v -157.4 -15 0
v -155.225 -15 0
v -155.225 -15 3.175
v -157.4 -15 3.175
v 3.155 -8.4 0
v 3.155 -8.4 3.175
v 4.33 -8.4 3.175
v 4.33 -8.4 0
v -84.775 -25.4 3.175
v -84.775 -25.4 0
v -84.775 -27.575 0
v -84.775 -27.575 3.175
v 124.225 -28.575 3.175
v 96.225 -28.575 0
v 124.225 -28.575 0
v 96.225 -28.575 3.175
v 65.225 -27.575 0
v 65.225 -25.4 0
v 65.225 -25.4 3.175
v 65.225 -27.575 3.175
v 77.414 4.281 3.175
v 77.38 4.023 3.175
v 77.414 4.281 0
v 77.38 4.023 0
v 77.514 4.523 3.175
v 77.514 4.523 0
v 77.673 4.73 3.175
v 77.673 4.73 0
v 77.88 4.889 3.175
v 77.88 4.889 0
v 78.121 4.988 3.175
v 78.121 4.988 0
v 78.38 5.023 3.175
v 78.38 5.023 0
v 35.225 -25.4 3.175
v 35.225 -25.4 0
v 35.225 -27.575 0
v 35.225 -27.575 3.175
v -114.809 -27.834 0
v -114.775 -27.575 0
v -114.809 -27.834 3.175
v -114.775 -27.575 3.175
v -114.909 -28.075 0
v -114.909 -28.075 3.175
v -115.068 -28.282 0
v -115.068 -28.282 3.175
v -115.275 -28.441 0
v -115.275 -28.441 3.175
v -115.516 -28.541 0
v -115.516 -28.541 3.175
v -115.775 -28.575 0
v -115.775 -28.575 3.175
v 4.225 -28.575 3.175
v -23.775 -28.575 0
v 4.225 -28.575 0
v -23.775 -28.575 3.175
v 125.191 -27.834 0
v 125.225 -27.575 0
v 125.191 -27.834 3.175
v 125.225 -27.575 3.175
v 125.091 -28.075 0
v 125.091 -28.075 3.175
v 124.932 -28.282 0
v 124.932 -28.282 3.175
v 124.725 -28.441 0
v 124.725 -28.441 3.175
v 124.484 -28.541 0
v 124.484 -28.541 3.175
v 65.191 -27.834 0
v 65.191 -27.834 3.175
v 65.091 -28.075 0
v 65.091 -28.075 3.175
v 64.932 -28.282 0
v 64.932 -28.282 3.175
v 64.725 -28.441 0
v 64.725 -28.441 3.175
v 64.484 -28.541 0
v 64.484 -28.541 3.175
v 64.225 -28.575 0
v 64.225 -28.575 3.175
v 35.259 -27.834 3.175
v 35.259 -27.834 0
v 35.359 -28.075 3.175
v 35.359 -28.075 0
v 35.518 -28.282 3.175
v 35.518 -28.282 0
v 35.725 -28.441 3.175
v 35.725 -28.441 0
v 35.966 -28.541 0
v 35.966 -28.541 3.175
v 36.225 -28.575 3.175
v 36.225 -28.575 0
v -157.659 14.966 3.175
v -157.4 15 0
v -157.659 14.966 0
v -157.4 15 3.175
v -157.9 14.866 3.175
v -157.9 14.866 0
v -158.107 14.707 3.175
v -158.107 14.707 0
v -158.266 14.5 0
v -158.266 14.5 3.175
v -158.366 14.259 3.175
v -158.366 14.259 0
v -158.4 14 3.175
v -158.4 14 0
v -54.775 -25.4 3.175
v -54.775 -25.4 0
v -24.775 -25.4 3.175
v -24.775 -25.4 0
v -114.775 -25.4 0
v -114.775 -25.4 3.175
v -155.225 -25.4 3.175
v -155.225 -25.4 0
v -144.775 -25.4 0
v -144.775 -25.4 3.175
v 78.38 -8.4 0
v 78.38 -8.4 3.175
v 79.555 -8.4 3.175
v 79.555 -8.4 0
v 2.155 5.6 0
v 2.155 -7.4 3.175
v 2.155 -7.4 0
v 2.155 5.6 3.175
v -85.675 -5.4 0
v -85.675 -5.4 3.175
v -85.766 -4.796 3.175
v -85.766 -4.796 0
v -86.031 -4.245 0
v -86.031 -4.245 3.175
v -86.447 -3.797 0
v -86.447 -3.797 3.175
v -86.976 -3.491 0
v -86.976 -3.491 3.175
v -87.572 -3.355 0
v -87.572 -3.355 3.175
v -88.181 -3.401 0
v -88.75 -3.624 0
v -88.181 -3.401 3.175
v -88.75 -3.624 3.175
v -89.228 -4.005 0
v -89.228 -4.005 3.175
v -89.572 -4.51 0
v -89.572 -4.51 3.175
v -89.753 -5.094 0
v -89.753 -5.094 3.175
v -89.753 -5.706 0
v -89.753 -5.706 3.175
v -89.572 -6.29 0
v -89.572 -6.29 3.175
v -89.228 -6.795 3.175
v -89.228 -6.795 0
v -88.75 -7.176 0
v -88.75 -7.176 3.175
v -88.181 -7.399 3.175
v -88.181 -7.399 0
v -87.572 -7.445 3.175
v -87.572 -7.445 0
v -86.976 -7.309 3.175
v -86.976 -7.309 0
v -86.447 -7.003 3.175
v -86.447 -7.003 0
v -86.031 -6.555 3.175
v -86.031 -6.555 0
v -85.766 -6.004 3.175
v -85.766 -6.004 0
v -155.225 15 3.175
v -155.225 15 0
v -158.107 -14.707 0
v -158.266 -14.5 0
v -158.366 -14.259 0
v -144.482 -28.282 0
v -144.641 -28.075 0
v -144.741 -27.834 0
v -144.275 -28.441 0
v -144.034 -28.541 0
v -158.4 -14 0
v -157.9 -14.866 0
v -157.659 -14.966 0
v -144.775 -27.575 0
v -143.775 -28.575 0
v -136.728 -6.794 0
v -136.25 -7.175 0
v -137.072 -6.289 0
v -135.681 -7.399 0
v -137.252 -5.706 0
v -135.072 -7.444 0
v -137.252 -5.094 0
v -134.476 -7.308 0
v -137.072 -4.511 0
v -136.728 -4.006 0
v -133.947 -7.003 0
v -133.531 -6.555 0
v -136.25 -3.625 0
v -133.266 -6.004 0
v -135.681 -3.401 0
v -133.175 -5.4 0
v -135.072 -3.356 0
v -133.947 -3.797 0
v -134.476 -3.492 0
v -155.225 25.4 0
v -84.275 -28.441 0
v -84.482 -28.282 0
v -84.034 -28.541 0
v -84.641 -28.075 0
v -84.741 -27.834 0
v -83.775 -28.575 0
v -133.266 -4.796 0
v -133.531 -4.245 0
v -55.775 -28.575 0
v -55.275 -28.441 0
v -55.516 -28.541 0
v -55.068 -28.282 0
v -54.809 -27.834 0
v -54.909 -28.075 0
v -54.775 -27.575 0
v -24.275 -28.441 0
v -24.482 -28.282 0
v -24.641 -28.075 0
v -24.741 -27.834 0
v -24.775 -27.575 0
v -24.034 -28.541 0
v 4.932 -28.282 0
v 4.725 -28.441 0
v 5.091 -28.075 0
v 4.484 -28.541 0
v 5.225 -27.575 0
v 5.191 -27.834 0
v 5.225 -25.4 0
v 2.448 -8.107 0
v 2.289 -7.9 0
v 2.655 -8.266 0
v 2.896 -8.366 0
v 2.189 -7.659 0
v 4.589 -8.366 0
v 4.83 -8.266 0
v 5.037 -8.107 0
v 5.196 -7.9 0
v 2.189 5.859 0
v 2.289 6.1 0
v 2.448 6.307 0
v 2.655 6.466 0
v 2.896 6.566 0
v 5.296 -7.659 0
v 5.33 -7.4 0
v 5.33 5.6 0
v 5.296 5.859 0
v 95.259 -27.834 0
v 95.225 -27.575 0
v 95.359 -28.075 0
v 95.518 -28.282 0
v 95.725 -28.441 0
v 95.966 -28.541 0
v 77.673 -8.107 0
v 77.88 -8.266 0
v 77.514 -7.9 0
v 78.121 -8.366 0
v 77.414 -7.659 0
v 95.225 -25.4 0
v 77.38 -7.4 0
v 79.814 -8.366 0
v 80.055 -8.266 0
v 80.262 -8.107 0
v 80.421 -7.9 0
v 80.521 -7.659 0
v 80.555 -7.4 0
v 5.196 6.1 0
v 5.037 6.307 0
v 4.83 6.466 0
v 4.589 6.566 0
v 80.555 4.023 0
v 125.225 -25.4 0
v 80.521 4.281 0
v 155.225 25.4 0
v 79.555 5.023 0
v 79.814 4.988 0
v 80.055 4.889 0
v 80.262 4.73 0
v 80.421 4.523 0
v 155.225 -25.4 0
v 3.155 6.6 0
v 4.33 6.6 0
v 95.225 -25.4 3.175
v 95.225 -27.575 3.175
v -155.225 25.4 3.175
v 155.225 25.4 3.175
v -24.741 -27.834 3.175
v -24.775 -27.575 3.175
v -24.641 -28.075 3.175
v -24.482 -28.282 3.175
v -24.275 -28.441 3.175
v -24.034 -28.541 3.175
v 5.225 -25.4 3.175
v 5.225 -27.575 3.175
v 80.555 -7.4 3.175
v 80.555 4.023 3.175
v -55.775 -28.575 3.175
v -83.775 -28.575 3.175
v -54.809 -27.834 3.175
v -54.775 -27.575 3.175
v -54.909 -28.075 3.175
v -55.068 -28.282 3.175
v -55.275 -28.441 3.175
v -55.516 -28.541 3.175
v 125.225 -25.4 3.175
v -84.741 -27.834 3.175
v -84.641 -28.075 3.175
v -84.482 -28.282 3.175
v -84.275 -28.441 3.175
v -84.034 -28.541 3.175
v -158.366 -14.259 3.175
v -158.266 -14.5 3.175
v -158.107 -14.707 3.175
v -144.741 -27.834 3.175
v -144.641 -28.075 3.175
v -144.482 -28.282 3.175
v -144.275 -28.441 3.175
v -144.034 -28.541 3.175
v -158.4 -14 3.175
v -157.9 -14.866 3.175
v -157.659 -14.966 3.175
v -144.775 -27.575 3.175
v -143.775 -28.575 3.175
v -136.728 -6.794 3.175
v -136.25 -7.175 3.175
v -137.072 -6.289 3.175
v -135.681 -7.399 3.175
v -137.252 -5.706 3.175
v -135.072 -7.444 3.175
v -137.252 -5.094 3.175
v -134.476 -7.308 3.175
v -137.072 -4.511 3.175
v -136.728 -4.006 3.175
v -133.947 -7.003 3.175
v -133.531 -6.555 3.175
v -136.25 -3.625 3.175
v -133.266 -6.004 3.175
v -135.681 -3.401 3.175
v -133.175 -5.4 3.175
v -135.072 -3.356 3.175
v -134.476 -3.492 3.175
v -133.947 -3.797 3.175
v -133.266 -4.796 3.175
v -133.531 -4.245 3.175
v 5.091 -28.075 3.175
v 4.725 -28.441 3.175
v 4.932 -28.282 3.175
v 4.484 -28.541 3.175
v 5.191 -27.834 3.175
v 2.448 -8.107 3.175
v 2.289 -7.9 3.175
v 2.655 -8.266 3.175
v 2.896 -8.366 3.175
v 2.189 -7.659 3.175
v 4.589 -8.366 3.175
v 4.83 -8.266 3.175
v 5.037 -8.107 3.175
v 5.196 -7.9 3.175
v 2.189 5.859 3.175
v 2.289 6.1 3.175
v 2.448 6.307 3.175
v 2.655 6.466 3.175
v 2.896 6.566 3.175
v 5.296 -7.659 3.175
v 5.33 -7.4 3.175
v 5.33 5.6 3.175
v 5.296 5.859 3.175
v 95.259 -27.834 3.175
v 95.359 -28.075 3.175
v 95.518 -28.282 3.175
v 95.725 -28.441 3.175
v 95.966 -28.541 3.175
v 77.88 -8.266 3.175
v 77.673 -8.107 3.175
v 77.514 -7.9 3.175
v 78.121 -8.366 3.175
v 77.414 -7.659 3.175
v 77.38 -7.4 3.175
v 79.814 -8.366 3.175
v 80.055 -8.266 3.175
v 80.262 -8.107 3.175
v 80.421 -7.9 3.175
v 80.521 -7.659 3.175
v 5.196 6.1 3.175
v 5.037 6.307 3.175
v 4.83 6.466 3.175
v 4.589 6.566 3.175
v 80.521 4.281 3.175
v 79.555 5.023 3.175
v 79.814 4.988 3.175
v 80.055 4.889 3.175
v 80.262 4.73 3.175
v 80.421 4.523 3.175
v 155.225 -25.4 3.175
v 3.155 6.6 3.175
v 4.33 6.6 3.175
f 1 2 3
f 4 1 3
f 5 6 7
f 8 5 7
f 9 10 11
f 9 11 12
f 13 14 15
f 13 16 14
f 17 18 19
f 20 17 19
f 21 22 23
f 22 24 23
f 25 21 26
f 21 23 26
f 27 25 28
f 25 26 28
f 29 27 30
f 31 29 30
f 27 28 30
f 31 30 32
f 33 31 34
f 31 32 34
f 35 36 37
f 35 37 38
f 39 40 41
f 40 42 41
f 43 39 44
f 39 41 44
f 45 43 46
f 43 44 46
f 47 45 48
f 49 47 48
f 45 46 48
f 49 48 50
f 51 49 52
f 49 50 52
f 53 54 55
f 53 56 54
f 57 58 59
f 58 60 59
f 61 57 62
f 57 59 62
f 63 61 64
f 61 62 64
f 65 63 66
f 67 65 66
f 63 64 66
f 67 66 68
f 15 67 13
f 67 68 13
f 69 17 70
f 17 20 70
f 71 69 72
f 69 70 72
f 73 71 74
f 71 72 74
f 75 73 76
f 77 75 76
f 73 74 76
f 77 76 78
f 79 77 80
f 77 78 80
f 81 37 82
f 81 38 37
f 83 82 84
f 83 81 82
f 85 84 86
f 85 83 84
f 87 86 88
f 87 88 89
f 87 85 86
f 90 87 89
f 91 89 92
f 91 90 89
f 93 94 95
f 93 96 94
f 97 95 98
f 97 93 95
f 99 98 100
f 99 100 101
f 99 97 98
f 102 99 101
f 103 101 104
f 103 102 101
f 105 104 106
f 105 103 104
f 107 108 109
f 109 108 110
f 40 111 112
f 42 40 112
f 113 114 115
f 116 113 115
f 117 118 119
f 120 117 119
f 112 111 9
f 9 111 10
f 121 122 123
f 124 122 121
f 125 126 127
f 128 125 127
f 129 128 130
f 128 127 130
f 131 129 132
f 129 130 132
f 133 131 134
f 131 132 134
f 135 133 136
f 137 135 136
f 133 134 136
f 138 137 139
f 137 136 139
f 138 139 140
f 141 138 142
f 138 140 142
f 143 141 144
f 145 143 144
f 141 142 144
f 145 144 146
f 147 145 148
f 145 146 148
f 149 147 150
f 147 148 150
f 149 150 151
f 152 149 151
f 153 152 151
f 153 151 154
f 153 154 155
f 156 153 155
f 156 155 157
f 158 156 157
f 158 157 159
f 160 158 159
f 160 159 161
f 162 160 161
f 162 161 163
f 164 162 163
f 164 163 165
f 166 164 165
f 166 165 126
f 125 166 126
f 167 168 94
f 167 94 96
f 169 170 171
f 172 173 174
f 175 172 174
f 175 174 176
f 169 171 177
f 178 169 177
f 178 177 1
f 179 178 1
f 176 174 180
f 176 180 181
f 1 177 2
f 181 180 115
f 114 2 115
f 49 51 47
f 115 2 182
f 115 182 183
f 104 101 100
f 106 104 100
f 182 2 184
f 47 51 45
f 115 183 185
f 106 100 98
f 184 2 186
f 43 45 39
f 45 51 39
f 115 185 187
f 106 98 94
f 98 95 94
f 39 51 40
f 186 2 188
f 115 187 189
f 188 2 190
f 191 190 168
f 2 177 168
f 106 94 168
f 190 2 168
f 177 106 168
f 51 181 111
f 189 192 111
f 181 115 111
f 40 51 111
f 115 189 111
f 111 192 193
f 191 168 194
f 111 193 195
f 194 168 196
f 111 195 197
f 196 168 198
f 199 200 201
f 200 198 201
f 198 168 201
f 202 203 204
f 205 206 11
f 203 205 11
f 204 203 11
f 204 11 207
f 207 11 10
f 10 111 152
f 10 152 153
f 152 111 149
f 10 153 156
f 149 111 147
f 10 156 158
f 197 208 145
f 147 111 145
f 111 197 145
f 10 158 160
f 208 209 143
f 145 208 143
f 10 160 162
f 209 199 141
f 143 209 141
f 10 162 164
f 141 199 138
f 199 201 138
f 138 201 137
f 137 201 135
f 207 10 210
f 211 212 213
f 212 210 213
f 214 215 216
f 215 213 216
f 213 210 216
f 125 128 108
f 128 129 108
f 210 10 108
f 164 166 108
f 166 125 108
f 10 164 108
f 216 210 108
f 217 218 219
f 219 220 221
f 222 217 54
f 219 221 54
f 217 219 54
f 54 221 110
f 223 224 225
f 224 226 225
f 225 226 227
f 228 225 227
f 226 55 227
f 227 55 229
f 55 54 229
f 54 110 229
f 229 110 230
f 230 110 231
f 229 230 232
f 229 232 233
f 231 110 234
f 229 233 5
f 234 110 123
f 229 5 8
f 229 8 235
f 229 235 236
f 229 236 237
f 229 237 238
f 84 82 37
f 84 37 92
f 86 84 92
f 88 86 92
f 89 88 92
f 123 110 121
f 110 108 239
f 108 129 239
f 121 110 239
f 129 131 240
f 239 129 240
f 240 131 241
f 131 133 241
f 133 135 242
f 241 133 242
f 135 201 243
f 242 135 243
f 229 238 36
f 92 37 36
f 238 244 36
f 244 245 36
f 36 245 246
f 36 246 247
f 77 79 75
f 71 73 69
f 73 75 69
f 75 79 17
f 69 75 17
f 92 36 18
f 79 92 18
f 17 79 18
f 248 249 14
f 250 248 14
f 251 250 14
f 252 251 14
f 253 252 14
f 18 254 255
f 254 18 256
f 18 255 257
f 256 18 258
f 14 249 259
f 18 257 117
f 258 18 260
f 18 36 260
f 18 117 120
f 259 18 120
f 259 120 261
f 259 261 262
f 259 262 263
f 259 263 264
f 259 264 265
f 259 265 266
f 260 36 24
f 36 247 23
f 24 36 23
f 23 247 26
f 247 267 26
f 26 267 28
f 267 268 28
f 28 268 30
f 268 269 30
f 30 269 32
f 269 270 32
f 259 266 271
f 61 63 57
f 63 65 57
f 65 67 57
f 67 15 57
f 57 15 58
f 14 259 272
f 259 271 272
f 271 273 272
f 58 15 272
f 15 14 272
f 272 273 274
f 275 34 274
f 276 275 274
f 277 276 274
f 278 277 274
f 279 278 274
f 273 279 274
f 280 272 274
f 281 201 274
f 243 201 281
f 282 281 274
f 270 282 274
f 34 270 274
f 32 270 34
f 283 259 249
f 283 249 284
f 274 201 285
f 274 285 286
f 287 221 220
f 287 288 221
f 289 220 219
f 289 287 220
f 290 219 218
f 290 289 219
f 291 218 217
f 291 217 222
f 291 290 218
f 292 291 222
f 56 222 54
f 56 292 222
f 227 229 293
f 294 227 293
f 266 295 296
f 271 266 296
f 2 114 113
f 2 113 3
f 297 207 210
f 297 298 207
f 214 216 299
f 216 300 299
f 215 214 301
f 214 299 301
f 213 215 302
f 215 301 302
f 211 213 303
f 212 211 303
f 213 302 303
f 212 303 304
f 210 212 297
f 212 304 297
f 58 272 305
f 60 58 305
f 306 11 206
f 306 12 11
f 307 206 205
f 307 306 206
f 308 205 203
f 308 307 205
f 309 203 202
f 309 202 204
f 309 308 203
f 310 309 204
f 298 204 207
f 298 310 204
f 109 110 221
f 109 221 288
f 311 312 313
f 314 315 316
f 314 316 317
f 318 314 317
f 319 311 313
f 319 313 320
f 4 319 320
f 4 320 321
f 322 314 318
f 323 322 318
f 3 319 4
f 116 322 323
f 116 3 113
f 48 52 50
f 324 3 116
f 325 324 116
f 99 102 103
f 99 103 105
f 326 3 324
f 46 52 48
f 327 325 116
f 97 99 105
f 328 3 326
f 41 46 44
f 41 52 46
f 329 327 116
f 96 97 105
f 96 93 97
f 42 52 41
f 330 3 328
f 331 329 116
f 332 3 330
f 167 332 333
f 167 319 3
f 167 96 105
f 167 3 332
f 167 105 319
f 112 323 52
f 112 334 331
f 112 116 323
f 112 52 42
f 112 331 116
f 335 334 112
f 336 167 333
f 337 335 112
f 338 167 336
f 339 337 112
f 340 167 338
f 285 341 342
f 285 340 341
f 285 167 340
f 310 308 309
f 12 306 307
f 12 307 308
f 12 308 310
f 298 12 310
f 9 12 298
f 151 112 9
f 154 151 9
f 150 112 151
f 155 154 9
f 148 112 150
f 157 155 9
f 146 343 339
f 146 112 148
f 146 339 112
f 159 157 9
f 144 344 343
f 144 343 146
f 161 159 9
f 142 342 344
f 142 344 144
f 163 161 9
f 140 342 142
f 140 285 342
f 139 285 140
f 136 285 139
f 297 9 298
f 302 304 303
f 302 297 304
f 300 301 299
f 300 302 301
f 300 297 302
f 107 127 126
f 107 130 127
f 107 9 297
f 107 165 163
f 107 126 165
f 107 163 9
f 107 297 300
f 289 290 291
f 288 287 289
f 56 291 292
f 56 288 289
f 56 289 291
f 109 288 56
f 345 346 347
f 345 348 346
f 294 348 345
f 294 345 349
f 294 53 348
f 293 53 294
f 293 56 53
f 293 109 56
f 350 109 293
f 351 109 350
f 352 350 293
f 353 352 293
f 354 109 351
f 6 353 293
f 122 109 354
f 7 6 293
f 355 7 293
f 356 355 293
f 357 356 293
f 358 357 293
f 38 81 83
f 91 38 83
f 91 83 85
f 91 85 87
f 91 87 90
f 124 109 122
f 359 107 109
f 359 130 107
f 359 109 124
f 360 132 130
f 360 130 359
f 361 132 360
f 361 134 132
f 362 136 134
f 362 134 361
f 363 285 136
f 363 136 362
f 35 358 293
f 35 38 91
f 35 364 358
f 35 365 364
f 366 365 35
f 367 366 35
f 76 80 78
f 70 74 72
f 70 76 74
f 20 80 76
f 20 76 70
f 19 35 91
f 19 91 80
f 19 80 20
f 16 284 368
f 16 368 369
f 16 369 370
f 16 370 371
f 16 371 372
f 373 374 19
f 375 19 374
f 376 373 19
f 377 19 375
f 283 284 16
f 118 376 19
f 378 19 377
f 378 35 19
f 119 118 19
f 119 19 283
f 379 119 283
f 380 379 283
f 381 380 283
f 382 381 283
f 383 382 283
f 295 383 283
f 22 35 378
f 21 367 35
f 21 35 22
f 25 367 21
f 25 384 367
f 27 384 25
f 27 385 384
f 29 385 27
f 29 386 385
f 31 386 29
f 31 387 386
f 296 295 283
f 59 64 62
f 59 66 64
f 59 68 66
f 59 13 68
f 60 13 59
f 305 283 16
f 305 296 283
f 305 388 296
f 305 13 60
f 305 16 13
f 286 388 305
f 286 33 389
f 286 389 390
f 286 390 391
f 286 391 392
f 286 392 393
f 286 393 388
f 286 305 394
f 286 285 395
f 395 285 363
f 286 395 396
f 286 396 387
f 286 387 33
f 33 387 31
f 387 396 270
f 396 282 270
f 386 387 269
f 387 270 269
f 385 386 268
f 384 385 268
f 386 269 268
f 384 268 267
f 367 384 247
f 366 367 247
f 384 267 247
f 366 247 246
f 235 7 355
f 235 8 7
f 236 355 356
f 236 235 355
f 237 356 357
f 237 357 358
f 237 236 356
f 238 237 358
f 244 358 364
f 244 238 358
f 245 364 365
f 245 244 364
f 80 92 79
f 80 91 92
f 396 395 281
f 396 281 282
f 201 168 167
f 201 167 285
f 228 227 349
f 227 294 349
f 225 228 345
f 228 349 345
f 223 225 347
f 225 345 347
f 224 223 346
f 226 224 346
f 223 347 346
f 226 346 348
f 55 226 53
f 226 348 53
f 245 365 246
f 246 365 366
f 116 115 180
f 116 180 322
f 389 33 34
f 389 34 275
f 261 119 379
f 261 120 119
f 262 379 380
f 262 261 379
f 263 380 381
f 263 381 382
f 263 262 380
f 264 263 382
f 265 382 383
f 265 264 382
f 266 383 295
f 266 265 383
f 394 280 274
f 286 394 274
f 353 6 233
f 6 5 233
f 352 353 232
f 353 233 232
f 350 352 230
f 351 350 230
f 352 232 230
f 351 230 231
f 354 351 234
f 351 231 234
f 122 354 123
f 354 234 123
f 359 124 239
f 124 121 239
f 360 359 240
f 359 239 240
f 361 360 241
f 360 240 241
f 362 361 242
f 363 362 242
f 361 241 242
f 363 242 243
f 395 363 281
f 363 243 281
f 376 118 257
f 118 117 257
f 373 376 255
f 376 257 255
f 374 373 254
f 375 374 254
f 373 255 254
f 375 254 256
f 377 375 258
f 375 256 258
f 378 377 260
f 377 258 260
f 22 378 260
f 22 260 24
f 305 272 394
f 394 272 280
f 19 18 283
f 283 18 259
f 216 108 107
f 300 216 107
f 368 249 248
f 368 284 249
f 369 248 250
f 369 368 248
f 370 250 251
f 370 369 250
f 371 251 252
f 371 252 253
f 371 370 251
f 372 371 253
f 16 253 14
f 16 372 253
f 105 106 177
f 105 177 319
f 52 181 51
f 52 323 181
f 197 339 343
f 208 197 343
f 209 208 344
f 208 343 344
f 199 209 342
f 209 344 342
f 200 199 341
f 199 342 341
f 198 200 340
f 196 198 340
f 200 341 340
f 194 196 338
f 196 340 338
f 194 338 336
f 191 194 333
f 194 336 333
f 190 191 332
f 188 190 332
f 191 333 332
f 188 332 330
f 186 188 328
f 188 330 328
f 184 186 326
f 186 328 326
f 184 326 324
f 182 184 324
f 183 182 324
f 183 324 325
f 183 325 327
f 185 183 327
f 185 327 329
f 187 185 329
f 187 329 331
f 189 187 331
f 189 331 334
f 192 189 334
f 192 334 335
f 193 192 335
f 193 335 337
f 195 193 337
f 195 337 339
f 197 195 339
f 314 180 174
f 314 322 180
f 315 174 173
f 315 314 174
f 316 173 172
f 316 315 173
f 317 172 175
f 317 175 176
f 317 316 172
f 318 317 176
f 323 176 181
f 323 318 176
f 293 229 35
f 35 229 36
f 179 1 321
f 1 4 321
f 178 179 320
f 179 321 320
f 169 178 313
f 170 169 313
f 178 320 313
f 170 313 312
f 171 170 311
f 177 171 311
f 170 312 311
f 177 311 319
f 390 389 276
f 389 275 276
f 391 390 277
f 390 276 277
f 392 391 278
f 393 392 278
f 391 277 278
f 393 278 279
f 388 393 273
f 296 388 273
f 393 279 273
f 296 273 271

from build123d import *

# Parameters (mm, degrees)
SKETCH1_W           = 310.45
SKETCH1_H           = 50.8
BOSS_EXTRUDE1_DEPTH = 3.175
SKETCH2_R           = 2.05
SKETCH2_R_2         = 2.050488176
SKETCH2_W           = 3.175
SKETCH2_H           = 13.42251169
SKETCH2_H_2         = 15
CUT_EXTRUDE1_DEPTH  = 4.175
SKETCH3_W           = 3.175
SKETCH3_H           = 30
BOSS_EXTRUDE2_DEPTH = 3.175
SKETCH4_W           = 30
SKETCH4_H           = 3.175
BOSS_EXTRUDE3_DEPTH = 3.175
FILLET1_R           = 1


with BuildPart() as part:
    # Sketch1 → Boss-Extrude1 (new body)
    with BuildSketch(Plane.XY):
        Rectangle(SKETCH1_W, SKETCH1_H)
    extrude(amount=BOSS_EXTRUDE1_DEPTH)

    # Sketch2 → Cut-Extrude1 (cut, through all)
    with BuildSketch(Plane.XY.offset(3.175)):
        with Locations((-135.225, -5.4)):
            Circle(SKETCH2_R)
        with Locations((-87.725, -5.4)):
            Circle(SKETCH2_R_2)
        with Locations((78.9675, -1.688744155)):
            Rectangle(SKETCH2_W, SKETCH2_H)
        with Locations((3.7425, -0.9)):
            Rectangle(SKETCH2_W, SKETCH2_H_2)
    extrude(amount=-CUT_EXTRUDE1_DEPTH, mode=Mode.SUBTRACT)

    # Sketch3 → Boss-Extrude2 (add)
    with BuildSketch(Plane.ZY.offset(155.225)):
        with Locations((1.5875, 0)):
            Rectangle(SKETCH3_W, SKETCH3_H)
    extrude(amount=BOSS_EXTRUDE2_DEPTH)

    # Sketch4 → Boss-Extrude3 (add)
    with BuildSketch(Plane.XZ.offset(25.4)):
        with Locations((110.225, 1.5875)):
            Rectangle(SKETCH4_W, SKETCH4_H)
        with Locations((50.225, 1.5875)):
            Rectangle(SKETCH4_W, SKETCH4_H)
        with Locations((-9.775, 1.5875)):
            Rectangle(SKETCH4_W, SKETCH4_H)
        with Locations((-69.775, 1.5875)):
            Rectangle(SKETCH4_W, SKETCH4_H)
        with Locations((-129.775, 1.5875)):
            Rectangle(SKETCH4_W, SKETCH4_H)
    extrude(amount=BOSS_EXTRUDE3_DEPTH)

    # Fillet1
    fillet1_edges = [part.edges().sort_by_distance(p)[0] for p in [
        (-84.775, -28.575, 1.5875),
        (-54.775, -28.575, 1.5875),
        (-144.775, -28.575, 1.5875),
        (-114.775, -28.575, 1.5875),
        (80.555, 5.02251169, 1.5875),
        (80.555, -8.4, 1.5875),
        (77.38, -8.4, 1.5875),
        (77.38, 5.02251169, 1.5875),
        (5.33, 6.6, 1.5875),
        (5.33, -8.4, 1.5875),
        (2.155, -8.4, 1.5875),
        (2.155, 6.6, 1.5875),
        (-158.4, 15, 1.5875),
        (-158.4, -15, 1.5875),
        (125.225, -28.575, 1.5875),
        (95.225, -28.575, 1.5875),
        (35.225, -28.575, 1.5875),
        (65.225, -28.575, 1.5875),
        (-24.775, -28.575, 1.5875),
        (5.225, -28.575, 1.5875),
    ]]
    fillet(fillet1_edges, radius=FILLET1_R)


solid = part.part
